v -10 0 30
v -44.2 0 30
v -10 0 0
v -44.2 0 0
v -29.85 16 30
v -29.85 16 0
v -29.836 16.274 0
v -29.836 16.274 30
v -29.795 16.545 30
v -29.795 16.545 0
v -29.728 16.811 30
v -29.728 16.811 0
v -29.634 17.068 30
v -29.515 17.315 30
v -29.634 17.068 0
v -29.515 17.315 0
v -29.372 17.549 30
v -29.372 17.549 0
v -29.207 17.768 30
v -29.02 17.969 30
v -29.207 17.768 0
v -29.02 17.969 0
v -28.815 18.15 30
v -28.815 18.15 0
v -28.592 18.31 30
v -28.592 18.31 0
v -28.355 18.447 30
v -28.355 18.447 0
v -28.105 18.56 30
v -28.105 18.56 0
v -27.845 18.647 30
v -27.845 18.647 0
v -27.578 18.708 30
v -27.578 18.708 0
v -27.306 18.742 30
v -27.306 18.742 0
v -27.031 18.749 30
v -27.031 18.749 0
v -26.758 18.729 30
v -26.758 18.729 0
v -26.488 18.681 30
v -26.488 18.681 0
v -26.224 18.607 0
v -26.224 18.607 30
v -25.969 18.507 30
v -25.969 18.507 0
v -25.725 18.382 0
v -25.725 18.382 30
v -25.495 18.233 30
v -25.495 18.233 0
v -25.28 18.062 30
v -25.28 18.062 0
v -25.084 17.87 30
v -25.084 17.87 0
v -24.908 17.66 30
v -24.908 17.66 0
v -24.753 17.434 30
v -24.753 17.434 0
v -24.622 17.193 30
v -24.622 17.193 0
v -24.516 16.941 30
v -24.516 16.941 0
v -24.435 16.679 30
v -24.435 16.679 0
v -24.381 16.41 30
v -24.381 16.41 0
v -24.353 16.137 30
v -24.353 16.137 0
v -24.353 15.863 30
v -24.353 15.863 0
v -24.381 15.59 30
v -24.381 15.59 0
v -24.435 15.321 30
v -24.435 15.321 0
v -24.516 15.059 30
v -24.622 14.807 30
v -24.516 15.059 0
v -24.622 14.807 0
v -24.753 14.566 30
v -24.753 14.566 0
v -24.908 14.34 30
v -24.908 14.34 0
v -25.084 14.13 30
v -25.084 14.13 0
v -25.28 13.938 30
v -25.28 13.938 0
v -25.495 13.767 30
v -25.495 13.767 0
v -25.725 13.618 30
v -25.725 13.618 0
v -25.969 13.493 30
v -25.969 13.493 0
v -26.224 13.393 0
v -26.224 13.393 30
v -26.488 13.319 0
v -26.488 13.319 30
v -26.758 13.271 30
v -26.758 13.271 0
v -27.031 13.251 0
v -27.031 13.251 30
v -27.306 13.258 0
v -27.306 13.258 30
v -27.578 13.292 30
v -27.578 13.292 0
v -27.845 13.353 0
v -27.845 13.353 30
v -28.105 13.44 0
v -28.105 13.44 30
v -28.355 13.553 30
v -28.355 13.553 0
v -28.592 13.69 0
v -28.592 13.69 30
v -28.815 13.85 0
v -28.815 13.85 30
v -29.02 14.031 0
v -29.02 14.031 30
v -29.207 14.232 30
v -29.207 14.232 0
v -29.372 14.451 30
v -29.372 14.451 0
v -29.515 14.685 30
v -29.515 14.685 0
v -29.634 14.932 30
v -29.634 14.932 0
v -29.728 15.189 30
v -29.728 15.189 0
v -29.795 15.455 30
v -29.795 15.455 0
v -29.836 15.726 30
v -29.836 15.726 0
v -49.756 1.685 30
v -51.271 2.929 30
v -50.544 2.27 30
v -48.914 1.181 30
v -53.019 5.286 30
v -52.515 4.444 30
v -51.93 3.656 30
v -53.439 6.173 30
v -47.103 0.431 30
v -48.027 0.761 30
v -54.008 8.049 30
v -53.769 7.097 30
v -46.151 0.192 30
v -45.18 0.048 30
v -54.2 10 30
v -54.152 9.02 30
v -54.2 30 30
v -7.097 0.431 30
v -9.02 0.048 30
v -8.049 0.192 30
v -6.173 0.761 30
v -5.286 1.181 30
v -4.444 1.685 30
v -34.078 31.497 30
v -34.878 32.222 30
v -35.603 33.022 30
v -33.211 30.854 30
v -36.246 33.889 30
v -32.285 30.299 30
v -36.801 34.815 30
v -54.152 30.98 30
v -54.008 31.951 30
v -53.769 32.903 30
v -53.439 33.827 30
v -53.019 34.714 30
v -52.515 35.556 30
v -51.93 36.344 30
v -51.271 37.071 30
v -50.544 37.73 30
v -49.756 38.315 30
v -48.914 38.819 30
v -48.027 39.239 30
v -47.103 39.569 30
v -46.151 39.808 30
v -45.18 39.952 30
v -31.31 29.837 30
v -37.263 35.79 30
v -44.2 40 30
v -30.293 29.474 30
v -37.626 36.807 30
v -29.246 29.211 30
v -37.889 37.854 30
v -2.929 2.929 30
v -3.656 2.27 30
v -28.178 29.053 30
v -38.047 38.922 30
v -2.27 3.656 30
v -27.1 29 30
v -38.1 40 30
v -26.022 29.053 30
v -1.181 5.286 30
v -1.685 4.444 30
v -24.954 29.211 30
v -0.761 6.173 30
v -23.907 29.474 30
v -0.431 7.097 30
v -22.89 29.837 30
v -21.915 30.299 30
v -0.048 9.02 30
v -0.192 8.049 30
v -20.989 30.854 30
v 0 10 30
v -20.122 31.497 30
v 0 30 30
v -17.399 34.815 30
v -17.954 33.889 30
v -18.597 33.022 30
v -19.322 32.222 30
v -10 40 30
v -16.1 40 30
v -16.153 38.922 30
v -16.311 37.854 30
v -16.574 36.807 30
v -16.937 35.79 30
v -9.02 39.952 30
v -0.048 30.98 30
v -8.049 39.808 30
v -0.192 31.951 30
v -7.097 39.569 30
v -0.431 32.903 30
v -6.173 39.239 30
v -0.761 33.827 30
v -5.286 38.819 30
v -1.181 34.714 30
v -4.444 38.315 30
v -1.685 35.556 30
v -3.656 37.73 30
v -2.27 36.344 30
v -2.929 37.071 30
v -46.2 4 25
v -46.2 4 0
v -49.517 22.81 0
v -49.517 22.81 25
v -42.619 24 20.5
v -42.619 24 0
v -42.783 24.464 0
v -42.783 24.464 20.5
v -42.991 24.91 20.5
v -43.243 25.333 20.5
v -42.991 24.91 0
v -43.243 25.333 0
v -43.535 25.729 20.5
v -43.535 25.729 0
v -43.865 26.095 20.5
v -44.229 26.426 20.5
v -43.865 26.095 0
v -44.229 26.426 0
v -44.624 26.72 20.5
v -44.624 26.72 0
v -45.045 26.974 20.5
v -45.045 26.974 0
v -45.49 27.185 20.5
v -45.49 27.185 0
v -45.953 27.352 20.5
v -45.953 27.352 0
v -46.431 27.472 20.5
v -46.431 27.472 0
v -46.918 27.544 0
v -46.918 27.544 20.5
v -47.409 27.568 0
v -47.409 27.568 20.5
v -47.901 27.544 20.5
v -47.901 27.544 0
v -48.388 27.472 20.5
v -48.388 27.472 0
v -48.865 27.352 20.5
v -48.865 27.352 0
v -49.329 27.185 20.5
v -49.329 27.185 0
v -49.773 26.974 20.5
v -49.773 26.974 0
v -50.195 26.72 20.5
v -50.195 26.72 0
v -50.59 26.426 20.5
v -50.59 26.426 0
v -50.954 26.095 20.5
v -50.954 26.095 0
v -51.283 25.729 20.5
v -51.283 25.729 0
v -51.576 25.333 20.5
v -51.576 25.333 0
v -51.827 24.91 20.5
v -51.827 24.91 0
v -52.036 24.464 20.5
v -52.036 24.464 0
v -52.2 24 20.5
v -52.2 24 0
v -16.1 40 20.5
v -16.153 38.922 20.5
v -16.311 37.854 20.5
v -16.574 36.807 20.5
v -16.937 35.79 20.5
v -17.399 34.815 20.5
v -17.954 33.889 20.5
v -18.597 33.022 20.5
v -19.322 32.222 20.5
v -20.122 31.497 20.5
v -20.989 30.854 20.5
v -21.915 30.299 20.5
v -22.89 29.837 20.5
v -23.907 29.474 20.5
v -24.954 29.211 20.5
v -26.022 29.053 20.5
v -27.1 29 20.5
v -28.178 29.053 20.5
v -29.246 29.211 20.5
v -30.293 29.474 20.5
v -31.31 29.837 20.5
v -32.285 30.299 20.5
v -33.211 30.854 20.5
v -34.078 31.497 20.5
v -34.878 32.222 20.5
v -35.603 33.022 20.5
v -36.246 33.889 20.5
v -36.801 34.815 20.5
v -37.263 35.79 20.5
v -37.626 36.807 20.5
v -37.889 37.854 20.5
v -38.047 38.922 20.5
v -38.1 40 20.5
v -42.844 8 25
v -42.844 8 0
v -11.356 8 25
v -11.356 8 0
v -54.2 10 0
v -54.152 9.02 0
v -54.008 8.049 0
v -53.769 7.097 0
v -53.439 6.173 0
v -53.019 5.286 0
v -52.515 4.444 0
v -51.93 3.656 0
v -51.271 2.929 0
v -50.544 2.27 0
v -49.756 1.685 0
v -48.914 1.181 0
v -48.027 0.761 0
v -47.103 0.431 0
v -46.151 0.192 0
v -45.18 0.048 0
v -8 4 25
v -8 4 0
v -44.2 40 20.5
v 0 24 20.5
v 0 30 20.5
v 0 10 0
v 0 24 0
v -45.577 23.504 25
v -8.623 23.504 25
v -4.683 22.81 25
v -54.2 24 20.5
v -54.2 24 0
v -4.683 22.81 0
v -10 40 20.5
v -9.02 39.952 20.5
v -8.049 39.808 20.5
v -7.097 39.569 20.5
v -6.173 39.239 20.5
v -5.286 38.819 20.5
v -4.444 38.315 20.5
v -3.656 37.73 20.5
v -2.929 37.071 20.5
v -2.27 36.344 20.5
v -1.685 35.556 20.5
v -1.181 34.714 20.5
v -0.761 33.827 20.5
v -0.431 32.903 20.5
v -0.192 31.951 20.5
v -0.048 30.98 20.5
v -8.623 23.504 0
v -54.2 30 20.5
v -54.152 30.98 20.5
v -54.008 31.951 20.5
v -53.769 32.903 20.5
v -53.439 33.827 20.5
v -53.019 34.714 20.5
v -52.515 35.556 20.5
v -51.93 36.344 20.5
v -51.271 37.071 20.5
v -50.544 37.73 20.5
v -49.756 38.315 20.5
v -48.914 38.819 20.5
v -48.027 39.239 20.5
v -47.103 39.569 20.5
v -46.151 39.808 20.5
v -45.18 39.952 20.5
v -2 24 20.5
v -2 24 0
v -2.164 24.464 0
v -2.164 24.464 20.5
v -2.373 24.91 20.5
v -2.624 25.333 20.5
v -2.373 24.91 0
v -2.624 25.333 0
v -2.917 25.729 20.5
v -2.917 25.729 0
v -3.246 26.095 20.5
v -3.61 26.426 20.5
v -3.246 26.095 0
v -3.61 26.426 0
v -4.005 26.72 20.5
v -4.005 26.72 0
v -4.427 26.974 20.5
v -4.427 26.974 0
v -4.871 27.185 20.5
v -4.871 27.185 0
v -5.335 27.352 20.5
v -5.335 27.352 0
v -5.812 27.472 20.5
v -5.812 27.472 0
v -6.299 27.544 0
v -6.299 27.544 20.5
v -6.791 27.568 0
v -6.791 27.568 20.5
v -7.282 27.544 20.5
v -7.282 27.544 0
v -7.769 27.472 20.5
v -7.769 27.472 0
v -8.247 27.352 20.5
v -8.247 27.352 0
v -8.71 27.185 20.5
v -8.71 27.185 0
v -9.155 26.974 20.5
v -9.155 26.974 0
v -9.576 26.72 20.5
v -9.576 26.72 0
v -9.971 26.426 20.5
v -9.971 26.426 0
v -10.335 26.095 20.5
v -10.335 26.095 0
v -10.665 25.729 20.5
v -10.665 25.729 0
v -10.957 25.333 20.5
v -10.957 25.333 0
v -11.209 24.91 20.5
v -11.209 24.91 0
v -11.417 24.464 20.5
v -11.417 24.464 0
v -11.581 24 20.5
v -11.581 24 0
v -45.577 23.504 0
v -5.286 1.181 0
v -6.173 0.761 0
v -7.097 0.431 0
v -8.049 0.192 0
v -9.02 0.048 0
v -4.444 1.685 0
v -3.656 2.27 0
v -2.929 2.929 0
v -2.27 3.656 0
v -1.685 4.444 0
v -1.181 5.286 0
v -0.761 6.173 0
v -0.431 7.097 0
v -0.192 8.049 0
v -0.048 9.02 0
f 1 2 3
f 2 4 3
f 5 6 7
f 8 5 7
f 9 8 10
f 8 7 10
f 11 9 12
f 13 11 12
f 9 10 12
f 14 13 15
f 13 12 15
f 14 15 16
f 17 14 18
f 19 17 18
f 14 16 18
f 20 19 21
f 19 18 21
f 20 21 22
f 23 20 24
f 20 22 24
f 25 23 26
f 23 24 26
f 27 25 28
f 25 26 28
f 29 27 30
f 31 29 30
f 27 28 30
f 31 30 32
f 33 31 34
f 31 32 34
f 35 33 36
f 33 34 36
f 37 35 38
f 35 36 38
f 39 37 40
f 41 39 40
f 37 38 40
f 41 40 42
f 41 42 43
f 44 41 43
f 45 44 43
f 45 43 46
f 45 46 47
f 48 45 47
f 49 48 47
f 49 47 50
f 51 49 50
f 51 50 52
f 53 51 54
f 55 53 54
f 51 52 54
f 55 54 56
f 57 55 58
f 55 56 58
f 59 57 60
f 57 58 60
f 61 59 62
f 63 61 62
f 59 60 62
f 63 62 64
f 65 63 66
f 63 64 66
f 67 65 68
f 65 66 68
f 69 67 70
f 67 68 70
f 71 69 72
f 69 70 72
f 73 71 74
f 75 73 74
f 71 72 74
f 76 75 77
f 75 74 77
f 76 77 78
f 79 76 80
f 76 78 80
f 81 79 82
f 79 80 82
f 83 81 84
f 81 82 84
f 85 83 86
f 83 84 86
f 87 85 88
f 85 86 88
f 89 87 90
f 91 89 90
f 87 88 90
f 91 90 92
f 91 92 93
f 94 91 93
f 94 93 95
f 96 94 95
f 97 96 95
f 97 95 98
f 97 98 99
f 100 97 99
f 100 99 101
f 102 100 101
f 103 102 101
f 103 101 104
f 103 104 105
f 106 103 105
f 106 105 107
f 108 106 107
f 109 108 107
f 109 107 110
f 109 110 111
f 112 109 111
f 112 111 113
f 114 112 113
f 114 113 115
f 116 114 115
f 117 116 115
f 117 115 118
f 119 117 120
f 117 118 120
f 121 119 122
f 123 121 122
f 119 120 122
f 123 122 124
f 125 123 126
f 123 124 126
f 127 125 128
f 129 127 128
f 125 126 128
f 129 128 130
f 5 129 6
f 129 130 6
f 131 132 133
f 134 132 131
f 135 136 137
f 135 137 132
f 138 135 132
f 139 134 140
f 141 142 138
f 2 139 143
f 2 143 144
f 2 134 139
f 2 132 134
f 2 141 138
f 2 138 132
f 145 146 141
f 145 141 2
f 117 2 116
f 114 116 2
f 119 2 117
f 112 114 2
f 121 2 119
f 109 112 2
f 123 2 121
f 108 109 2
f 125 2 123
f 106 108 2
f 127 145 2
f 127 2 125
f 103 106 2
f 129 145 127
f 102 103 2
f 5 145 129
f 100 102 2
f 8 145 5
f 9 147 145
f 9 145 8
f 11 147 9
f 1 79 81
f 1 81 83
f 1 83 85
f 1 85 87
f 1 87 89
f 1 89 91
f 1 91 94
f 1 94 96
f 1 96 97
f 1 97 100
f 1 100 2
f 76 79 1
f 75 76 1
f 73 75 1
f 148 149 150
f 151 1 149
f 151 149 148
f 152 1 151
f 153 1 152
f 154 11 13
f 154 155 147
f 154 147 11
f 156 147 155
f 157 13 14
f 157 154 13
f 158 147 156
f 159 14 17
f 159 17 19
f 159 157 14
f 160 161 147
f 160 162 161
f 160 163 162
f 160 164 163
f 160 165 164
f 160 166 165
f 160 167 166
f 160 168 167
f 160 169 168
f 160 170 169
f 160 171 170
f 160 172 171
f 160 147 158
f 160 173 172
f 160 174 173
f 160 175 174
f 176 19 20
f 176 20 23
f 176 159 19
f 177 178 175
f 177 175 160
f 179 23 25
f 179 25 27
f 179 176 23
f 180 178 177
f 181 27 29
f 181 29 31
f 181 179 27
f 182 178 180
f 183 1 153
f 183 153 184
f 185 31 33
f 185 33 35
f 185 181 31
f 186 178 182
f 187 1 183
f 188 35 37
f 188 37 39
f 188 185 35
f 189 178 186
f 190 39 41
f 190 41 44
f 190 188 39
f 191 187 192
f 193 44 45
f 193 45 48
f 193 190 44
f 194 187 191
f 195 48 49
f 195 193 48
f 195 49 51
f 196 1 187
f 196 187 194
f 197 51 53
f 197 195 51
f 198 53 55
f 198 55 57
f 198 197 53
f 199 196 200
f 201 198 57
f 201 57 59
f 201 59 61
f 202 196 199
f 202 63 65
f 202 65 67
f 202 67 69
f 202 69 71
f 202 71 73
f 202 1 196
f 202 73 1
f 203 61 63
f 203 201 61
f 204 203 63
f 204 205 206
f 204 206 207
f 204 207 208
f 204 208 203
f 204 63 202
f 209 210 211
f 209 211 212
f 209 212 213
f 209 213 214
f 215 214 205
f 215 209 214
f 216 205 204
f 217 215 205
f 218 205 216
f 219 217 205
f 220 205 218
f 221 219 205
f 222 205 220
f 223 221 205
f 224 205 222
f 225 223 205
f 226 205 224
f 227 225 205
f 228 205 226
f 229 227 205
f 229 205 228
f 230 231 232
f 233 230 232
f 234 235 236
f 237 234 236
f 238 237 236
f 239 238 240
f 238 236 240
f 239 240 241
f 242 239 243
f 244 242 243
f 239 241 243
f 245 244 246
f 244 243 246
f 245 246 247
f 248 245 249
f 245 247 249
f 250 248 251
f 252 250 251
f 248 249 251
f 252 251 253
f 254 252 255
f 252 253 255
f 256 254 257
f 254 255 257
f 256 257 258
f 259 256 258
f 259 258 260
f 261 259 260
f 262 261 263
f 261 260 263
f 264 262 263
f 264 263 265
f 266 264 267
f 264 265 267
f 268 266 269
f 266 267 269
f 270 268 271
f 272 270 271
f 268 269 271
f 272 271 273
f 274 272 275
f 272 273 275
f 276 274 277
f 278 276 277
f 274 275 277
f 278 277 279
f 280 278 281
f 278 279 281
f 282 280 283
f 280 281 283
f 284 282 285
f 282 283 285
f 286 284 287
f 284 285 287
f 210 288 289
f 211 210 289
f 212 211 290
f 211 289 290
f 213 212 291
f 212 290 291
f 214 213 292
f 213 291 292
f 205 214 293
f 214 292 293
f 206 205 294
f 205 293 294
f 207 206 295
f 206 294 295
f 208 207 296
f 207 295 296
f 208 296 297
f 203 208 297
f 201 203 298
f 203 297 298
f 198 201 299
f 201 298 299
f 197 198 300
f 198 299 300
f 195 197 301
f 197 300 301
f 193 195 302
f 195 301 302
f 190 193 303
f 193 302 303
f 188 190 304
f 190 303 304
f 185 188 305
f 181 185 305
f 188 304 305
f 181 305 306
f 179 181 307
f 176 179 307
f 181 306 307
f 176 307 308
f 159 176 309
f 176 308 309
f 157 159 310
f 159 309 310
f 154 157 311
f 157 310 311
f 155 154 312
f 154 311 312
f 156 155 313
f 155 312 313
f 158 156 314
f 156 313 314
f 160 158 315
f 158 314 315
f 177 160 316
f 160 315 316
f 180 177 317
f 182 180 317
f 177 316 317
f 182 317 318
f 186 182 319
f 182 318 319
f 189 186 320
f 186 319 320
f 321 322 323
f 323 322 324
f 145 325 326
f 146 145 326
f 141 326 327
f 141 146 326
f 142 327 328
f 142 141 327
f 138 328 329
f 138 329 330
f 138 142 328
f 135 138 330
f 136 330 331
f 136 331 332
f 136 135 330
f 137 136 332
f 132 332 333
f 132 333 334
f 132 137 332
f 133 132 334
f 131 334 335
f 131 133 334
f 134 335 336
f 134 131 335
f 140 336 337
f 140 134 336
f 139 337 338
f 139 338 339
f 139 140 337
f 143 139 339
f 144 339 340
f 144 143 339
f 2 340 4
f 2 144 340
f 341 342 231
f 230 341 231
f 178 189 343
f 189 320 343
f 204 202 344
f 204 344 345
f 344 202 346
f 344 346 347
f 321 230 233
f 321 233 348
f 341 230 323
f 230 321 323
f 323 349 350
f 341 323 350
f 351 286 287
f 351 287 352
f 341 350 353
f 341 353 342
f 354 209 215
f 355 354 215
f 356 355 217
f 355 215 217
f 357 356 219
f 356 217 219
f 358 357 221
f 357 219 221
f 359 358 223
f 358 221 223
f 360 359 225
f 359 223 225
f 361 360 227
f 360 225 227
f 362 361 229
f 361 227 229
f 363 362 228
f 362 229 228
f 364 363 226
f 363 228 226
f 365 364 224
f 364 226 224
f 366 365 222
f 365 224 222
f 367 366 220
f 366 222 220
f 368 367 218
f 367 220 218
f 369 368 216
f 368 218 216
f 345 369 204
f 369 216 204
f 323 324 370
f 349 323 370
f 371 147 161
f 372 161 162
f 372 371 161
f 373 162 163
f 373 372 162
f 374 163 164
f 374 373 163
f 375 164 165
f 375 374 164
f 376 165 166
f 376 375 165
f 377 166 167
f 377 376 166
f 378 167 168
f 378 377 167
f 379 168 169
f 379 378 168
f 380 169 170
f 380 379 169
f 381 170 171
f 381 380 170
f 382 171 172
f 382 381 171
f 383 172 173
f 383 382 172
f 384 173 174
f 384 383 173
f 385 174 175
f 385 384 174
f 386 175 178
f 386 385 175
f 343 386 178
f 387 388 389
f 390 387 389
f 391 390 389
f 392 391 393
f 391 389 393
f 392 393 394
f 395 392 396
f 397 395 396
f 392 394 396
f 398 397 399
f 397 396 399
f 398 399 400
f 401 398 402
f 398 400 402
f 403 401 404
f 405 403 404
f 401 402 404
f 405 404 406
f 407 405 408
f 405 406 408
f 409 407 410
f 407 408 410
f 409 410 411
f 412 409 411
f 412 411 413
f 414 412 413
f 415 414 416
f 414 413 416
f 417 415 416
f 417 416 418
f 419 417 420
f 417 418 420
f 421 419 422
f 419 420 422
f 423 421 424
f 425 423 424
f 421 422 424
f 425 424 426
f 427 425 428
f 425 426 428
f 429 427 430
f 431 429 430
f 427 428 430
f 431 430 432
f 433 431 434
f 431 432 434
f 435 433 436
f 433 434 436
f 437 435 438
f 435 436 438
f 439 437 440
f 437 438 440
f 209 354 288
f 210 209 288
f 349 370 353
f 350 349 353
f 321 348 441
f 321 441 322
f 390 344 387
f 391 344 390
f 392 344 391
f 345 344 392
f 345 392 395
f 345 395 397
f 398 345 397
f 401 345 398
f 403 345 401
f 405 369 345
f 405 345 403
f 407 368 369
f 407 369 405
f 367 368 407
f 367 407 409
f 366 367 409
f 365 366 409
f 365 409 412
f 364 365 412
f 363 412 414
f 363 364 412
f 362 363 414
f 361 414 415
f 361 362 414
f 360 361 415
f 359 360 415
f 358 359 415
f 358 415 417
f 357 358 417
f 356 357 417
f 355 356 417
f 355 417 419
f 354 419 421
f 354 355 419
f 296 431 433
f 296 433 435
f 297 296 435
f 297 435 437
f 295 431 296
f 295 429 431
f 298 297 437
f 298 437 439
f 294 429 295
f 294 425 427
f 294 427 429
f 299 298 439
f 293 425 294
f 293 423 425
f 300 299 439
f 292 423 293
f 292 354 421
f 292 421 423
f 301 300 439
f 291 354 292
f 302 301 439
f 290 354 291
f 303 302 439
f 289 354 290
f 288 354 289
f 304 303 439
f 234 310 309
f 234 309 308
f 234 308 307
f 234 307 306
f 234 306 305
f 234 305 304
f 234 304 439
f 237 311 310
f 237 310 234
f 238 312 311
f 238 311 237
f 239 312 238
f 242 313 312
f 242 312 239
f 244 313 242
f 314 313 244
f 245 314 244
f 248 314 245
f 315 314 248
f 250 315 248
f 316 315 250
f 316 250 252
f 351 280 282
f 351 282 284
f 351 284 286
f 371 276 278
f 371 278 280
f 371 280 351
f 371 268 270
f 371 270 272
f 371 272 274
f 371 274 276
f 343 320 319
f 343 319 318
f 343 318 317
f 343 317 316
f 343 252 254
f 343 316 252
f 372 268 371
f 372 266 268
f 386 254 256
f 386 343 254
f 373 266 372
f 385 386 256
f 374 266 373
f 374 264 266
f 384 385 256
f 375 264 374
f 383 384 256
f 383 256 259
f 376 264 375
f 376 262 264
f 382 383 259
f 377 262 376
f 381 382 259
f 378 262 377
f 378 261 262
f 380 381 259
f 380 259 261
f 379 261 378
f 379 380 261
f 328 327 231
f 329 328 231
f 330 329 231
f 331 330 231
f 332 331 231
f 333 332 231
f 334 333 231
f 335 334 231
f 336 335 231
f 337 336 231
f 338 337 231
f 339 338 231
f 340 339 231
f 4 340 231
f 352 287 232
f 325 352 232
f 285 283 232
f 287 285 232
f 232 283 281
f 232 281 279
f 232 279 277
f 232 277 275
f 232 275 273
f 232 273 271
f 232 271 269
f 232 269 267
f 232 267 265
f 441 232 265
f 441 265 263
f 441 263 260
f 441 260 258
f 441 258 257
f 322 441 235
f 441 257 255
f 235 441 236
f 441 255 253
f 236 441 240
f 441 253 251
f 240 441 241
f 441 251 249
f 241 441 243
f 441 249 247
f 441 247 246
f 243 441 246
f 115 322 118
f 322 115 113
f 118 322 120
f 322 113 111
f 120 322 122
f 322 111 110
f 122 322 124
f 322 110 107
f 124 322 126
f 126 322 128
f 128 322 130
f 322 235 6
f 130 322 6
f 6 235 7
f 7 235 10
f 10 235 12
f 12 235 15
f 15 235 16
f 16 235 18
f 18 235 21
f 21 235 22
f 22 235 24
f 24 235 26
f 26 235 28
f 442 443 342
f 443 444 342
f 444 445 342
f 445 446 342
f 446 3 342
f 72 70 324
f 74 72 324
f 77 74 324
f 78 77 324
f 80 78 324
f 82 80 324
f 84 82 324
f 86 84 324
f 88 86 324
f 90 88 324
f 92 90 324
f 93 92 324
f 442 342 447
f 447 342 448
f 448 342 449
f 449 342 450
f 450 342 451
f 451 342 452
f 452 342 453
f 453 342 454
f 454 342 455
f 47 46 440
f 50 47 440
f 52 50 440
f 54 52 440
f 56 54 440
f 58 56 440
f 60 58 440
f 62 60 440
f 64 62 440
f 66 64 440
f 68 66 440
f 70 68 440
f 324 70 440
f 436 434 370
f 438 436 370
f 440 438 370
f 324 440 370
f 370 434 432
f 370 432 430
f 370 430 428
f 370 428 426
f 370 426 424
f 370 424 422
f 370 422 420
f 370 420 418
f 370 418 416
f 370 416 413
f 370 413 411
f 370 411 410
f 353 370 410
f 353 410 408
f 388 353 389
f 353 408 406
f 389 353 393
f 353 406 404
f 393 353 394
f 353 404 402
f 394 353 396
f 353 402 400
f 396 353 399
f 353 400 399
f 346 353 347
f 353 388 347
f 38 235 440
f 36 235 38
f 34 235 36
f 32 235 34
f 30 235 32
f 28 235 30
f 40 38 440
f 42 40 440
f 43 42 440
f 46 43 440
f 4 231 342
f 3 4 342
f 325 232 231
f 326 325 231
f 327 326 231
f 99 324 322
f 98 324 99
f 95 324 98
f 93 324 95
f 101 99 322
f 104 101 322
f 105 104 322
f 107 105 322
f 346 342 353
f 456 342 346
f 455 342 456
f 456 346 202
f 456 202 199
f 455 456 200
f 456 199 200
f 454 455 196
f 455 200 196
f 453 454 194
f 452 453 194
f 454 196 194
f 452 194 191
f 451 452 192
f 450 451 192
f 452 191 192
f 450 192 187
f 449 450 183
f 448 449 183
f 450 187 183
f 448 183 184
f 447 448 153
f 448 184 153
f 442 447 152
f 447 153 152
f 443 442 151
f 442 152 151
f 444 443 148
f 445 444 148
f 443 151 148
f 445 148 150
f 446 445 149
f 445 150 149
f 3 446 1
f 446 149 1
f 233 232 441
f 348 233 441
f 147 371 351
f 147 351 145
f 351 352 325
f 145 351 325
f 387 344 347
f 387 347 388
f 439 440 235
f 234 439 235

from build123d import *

# Parameters (mm, degrees)
SKETCH1_W           = 54.2
SKETCH1_H           = 25
BOSS_EXTRUDE1_DEPTH = 25
BOSS_EXTRUDE2_DEPTH = 5
FILLET1_R           = 10
FILLET2_R           = 10
CUT_EXTRUDE1_DEPTH  = 20.5
SKETCH5_R           = 2.75
CUT_EXTRUDE2_DEPTH  = 30


with BuildPart() as part:
    # Sketch1 → Boss-Extrude1 (new body)
    with BuildSketch(Plane.XY):
        with Locations((-27.1, 12.5)):
            Rectangle(SKETCH1_W, SKETCH1_H)
        Polygon((-46.2, 4), (-49.516680193, 22.809828083), (-45.577449181, 23.504420793), (-42.843601475, 8), (-11.356398525, 8), (-8.622550819, 23.504420793), (-4.683319807, 22.809828083), (-8, 4), align=None, mode=Mode.SUBTRACT)
        with BuildLine():
            Line((-54.2, 25), (0, 25))
            Line((0, 25), (0, 40))
            Line((0, 40), (-16.1, 40))
            ThreePointArc((-16.1, 40), (-27.1, 29), (-38.1, 40))
            Line((-38.1, 40), (-54.2, 40))
            Line((-54.2, 40), (-54.2, 25))
        make_face()
    extrude(amount=BOSS_EXTRUDE1_DEPTH)

    # Sketch2 → Boss-Extrude2 (add)
    with BuildSketch(Plane.XY.offset(25)):
        with BuildLine():
            Line((-54.2, 40), (-54.2, 0))
            Line((-54.2, 0), (0, 0))
            Line((0, 0), (0, 40))
            Line((0, 40), (-16.1, 40))
            ThreePointArc((-16.1, 40), (-27.1, 29), (-38.1, 40))
            Line((-38.1, 40), (-54.2, 40))
        make_face()
    extrude(amount=BOSS_EXTRUDE2_DEPTH)

    # Fillet1
    fillet1_edges = [part.edges().sort_by_distance(p)[0] for p in [
        (0, 0, 15),
        (-54.2, 0, 15),
    ]]
    fillet(fillet1_edges, radius=FILLET1_R)

    # Fillet2
    fillet2_edges = [part.edges().sort_by_distance(p)[0] for p in [
        (-54.2, 40, 15),
        (0, 40, 15),
    ]]
    fillet(fillet2_edges, radius=FILLET2_R)

    # Sketch4 → Cut-Extrude1 (cut)
    with BuildSketch(Plane(origin=(0, 0, 0), x_dir=(-1, 0, 0), z_dir=(0, 0, -1))):
        with BuildLine():
            ThreePointArc((38.1, 40), (27.1, 29), (16.1, 40))
            Line((16.1, 40), (0, 40))
            Line((0, 40), (0, 24))
            Line((0, 24), (2, 24))
            ThreePointArc((2, 24), (6.790667282, 27.568390069), (11.581334564, 24))
            Line((11.581334564, 24), (42.618665436, 24))
            ThreePointArc((42.618665436, 24), (47.409332718, 27.568390069), (52.2, 24))
            Line((52.2, 24), (54.2, 24))
            Line((54.2, 24), (54.2, 40))
            Line((54.2, 40), (38.1, 40))
        make_face()
    extrude(amount=-CUT_EXTRUDE1_DEPTH, mode=Mode.SUBTRACT)

    # Sketch5 → Cut-Extrude2 (cut)
    with BuildSketch(Plane(origin=(0, 0, 0), x_dir=(-1, 0, 0), z_dir=(0, 0, -1))):
        with Locations((27.1, 16)):
            Circle(SKETCH5_R)
    extrude(amount=-CUT_EXTRUDE2_DEPTH, mode=Mode.SUBTRACT)


solid = part.part
